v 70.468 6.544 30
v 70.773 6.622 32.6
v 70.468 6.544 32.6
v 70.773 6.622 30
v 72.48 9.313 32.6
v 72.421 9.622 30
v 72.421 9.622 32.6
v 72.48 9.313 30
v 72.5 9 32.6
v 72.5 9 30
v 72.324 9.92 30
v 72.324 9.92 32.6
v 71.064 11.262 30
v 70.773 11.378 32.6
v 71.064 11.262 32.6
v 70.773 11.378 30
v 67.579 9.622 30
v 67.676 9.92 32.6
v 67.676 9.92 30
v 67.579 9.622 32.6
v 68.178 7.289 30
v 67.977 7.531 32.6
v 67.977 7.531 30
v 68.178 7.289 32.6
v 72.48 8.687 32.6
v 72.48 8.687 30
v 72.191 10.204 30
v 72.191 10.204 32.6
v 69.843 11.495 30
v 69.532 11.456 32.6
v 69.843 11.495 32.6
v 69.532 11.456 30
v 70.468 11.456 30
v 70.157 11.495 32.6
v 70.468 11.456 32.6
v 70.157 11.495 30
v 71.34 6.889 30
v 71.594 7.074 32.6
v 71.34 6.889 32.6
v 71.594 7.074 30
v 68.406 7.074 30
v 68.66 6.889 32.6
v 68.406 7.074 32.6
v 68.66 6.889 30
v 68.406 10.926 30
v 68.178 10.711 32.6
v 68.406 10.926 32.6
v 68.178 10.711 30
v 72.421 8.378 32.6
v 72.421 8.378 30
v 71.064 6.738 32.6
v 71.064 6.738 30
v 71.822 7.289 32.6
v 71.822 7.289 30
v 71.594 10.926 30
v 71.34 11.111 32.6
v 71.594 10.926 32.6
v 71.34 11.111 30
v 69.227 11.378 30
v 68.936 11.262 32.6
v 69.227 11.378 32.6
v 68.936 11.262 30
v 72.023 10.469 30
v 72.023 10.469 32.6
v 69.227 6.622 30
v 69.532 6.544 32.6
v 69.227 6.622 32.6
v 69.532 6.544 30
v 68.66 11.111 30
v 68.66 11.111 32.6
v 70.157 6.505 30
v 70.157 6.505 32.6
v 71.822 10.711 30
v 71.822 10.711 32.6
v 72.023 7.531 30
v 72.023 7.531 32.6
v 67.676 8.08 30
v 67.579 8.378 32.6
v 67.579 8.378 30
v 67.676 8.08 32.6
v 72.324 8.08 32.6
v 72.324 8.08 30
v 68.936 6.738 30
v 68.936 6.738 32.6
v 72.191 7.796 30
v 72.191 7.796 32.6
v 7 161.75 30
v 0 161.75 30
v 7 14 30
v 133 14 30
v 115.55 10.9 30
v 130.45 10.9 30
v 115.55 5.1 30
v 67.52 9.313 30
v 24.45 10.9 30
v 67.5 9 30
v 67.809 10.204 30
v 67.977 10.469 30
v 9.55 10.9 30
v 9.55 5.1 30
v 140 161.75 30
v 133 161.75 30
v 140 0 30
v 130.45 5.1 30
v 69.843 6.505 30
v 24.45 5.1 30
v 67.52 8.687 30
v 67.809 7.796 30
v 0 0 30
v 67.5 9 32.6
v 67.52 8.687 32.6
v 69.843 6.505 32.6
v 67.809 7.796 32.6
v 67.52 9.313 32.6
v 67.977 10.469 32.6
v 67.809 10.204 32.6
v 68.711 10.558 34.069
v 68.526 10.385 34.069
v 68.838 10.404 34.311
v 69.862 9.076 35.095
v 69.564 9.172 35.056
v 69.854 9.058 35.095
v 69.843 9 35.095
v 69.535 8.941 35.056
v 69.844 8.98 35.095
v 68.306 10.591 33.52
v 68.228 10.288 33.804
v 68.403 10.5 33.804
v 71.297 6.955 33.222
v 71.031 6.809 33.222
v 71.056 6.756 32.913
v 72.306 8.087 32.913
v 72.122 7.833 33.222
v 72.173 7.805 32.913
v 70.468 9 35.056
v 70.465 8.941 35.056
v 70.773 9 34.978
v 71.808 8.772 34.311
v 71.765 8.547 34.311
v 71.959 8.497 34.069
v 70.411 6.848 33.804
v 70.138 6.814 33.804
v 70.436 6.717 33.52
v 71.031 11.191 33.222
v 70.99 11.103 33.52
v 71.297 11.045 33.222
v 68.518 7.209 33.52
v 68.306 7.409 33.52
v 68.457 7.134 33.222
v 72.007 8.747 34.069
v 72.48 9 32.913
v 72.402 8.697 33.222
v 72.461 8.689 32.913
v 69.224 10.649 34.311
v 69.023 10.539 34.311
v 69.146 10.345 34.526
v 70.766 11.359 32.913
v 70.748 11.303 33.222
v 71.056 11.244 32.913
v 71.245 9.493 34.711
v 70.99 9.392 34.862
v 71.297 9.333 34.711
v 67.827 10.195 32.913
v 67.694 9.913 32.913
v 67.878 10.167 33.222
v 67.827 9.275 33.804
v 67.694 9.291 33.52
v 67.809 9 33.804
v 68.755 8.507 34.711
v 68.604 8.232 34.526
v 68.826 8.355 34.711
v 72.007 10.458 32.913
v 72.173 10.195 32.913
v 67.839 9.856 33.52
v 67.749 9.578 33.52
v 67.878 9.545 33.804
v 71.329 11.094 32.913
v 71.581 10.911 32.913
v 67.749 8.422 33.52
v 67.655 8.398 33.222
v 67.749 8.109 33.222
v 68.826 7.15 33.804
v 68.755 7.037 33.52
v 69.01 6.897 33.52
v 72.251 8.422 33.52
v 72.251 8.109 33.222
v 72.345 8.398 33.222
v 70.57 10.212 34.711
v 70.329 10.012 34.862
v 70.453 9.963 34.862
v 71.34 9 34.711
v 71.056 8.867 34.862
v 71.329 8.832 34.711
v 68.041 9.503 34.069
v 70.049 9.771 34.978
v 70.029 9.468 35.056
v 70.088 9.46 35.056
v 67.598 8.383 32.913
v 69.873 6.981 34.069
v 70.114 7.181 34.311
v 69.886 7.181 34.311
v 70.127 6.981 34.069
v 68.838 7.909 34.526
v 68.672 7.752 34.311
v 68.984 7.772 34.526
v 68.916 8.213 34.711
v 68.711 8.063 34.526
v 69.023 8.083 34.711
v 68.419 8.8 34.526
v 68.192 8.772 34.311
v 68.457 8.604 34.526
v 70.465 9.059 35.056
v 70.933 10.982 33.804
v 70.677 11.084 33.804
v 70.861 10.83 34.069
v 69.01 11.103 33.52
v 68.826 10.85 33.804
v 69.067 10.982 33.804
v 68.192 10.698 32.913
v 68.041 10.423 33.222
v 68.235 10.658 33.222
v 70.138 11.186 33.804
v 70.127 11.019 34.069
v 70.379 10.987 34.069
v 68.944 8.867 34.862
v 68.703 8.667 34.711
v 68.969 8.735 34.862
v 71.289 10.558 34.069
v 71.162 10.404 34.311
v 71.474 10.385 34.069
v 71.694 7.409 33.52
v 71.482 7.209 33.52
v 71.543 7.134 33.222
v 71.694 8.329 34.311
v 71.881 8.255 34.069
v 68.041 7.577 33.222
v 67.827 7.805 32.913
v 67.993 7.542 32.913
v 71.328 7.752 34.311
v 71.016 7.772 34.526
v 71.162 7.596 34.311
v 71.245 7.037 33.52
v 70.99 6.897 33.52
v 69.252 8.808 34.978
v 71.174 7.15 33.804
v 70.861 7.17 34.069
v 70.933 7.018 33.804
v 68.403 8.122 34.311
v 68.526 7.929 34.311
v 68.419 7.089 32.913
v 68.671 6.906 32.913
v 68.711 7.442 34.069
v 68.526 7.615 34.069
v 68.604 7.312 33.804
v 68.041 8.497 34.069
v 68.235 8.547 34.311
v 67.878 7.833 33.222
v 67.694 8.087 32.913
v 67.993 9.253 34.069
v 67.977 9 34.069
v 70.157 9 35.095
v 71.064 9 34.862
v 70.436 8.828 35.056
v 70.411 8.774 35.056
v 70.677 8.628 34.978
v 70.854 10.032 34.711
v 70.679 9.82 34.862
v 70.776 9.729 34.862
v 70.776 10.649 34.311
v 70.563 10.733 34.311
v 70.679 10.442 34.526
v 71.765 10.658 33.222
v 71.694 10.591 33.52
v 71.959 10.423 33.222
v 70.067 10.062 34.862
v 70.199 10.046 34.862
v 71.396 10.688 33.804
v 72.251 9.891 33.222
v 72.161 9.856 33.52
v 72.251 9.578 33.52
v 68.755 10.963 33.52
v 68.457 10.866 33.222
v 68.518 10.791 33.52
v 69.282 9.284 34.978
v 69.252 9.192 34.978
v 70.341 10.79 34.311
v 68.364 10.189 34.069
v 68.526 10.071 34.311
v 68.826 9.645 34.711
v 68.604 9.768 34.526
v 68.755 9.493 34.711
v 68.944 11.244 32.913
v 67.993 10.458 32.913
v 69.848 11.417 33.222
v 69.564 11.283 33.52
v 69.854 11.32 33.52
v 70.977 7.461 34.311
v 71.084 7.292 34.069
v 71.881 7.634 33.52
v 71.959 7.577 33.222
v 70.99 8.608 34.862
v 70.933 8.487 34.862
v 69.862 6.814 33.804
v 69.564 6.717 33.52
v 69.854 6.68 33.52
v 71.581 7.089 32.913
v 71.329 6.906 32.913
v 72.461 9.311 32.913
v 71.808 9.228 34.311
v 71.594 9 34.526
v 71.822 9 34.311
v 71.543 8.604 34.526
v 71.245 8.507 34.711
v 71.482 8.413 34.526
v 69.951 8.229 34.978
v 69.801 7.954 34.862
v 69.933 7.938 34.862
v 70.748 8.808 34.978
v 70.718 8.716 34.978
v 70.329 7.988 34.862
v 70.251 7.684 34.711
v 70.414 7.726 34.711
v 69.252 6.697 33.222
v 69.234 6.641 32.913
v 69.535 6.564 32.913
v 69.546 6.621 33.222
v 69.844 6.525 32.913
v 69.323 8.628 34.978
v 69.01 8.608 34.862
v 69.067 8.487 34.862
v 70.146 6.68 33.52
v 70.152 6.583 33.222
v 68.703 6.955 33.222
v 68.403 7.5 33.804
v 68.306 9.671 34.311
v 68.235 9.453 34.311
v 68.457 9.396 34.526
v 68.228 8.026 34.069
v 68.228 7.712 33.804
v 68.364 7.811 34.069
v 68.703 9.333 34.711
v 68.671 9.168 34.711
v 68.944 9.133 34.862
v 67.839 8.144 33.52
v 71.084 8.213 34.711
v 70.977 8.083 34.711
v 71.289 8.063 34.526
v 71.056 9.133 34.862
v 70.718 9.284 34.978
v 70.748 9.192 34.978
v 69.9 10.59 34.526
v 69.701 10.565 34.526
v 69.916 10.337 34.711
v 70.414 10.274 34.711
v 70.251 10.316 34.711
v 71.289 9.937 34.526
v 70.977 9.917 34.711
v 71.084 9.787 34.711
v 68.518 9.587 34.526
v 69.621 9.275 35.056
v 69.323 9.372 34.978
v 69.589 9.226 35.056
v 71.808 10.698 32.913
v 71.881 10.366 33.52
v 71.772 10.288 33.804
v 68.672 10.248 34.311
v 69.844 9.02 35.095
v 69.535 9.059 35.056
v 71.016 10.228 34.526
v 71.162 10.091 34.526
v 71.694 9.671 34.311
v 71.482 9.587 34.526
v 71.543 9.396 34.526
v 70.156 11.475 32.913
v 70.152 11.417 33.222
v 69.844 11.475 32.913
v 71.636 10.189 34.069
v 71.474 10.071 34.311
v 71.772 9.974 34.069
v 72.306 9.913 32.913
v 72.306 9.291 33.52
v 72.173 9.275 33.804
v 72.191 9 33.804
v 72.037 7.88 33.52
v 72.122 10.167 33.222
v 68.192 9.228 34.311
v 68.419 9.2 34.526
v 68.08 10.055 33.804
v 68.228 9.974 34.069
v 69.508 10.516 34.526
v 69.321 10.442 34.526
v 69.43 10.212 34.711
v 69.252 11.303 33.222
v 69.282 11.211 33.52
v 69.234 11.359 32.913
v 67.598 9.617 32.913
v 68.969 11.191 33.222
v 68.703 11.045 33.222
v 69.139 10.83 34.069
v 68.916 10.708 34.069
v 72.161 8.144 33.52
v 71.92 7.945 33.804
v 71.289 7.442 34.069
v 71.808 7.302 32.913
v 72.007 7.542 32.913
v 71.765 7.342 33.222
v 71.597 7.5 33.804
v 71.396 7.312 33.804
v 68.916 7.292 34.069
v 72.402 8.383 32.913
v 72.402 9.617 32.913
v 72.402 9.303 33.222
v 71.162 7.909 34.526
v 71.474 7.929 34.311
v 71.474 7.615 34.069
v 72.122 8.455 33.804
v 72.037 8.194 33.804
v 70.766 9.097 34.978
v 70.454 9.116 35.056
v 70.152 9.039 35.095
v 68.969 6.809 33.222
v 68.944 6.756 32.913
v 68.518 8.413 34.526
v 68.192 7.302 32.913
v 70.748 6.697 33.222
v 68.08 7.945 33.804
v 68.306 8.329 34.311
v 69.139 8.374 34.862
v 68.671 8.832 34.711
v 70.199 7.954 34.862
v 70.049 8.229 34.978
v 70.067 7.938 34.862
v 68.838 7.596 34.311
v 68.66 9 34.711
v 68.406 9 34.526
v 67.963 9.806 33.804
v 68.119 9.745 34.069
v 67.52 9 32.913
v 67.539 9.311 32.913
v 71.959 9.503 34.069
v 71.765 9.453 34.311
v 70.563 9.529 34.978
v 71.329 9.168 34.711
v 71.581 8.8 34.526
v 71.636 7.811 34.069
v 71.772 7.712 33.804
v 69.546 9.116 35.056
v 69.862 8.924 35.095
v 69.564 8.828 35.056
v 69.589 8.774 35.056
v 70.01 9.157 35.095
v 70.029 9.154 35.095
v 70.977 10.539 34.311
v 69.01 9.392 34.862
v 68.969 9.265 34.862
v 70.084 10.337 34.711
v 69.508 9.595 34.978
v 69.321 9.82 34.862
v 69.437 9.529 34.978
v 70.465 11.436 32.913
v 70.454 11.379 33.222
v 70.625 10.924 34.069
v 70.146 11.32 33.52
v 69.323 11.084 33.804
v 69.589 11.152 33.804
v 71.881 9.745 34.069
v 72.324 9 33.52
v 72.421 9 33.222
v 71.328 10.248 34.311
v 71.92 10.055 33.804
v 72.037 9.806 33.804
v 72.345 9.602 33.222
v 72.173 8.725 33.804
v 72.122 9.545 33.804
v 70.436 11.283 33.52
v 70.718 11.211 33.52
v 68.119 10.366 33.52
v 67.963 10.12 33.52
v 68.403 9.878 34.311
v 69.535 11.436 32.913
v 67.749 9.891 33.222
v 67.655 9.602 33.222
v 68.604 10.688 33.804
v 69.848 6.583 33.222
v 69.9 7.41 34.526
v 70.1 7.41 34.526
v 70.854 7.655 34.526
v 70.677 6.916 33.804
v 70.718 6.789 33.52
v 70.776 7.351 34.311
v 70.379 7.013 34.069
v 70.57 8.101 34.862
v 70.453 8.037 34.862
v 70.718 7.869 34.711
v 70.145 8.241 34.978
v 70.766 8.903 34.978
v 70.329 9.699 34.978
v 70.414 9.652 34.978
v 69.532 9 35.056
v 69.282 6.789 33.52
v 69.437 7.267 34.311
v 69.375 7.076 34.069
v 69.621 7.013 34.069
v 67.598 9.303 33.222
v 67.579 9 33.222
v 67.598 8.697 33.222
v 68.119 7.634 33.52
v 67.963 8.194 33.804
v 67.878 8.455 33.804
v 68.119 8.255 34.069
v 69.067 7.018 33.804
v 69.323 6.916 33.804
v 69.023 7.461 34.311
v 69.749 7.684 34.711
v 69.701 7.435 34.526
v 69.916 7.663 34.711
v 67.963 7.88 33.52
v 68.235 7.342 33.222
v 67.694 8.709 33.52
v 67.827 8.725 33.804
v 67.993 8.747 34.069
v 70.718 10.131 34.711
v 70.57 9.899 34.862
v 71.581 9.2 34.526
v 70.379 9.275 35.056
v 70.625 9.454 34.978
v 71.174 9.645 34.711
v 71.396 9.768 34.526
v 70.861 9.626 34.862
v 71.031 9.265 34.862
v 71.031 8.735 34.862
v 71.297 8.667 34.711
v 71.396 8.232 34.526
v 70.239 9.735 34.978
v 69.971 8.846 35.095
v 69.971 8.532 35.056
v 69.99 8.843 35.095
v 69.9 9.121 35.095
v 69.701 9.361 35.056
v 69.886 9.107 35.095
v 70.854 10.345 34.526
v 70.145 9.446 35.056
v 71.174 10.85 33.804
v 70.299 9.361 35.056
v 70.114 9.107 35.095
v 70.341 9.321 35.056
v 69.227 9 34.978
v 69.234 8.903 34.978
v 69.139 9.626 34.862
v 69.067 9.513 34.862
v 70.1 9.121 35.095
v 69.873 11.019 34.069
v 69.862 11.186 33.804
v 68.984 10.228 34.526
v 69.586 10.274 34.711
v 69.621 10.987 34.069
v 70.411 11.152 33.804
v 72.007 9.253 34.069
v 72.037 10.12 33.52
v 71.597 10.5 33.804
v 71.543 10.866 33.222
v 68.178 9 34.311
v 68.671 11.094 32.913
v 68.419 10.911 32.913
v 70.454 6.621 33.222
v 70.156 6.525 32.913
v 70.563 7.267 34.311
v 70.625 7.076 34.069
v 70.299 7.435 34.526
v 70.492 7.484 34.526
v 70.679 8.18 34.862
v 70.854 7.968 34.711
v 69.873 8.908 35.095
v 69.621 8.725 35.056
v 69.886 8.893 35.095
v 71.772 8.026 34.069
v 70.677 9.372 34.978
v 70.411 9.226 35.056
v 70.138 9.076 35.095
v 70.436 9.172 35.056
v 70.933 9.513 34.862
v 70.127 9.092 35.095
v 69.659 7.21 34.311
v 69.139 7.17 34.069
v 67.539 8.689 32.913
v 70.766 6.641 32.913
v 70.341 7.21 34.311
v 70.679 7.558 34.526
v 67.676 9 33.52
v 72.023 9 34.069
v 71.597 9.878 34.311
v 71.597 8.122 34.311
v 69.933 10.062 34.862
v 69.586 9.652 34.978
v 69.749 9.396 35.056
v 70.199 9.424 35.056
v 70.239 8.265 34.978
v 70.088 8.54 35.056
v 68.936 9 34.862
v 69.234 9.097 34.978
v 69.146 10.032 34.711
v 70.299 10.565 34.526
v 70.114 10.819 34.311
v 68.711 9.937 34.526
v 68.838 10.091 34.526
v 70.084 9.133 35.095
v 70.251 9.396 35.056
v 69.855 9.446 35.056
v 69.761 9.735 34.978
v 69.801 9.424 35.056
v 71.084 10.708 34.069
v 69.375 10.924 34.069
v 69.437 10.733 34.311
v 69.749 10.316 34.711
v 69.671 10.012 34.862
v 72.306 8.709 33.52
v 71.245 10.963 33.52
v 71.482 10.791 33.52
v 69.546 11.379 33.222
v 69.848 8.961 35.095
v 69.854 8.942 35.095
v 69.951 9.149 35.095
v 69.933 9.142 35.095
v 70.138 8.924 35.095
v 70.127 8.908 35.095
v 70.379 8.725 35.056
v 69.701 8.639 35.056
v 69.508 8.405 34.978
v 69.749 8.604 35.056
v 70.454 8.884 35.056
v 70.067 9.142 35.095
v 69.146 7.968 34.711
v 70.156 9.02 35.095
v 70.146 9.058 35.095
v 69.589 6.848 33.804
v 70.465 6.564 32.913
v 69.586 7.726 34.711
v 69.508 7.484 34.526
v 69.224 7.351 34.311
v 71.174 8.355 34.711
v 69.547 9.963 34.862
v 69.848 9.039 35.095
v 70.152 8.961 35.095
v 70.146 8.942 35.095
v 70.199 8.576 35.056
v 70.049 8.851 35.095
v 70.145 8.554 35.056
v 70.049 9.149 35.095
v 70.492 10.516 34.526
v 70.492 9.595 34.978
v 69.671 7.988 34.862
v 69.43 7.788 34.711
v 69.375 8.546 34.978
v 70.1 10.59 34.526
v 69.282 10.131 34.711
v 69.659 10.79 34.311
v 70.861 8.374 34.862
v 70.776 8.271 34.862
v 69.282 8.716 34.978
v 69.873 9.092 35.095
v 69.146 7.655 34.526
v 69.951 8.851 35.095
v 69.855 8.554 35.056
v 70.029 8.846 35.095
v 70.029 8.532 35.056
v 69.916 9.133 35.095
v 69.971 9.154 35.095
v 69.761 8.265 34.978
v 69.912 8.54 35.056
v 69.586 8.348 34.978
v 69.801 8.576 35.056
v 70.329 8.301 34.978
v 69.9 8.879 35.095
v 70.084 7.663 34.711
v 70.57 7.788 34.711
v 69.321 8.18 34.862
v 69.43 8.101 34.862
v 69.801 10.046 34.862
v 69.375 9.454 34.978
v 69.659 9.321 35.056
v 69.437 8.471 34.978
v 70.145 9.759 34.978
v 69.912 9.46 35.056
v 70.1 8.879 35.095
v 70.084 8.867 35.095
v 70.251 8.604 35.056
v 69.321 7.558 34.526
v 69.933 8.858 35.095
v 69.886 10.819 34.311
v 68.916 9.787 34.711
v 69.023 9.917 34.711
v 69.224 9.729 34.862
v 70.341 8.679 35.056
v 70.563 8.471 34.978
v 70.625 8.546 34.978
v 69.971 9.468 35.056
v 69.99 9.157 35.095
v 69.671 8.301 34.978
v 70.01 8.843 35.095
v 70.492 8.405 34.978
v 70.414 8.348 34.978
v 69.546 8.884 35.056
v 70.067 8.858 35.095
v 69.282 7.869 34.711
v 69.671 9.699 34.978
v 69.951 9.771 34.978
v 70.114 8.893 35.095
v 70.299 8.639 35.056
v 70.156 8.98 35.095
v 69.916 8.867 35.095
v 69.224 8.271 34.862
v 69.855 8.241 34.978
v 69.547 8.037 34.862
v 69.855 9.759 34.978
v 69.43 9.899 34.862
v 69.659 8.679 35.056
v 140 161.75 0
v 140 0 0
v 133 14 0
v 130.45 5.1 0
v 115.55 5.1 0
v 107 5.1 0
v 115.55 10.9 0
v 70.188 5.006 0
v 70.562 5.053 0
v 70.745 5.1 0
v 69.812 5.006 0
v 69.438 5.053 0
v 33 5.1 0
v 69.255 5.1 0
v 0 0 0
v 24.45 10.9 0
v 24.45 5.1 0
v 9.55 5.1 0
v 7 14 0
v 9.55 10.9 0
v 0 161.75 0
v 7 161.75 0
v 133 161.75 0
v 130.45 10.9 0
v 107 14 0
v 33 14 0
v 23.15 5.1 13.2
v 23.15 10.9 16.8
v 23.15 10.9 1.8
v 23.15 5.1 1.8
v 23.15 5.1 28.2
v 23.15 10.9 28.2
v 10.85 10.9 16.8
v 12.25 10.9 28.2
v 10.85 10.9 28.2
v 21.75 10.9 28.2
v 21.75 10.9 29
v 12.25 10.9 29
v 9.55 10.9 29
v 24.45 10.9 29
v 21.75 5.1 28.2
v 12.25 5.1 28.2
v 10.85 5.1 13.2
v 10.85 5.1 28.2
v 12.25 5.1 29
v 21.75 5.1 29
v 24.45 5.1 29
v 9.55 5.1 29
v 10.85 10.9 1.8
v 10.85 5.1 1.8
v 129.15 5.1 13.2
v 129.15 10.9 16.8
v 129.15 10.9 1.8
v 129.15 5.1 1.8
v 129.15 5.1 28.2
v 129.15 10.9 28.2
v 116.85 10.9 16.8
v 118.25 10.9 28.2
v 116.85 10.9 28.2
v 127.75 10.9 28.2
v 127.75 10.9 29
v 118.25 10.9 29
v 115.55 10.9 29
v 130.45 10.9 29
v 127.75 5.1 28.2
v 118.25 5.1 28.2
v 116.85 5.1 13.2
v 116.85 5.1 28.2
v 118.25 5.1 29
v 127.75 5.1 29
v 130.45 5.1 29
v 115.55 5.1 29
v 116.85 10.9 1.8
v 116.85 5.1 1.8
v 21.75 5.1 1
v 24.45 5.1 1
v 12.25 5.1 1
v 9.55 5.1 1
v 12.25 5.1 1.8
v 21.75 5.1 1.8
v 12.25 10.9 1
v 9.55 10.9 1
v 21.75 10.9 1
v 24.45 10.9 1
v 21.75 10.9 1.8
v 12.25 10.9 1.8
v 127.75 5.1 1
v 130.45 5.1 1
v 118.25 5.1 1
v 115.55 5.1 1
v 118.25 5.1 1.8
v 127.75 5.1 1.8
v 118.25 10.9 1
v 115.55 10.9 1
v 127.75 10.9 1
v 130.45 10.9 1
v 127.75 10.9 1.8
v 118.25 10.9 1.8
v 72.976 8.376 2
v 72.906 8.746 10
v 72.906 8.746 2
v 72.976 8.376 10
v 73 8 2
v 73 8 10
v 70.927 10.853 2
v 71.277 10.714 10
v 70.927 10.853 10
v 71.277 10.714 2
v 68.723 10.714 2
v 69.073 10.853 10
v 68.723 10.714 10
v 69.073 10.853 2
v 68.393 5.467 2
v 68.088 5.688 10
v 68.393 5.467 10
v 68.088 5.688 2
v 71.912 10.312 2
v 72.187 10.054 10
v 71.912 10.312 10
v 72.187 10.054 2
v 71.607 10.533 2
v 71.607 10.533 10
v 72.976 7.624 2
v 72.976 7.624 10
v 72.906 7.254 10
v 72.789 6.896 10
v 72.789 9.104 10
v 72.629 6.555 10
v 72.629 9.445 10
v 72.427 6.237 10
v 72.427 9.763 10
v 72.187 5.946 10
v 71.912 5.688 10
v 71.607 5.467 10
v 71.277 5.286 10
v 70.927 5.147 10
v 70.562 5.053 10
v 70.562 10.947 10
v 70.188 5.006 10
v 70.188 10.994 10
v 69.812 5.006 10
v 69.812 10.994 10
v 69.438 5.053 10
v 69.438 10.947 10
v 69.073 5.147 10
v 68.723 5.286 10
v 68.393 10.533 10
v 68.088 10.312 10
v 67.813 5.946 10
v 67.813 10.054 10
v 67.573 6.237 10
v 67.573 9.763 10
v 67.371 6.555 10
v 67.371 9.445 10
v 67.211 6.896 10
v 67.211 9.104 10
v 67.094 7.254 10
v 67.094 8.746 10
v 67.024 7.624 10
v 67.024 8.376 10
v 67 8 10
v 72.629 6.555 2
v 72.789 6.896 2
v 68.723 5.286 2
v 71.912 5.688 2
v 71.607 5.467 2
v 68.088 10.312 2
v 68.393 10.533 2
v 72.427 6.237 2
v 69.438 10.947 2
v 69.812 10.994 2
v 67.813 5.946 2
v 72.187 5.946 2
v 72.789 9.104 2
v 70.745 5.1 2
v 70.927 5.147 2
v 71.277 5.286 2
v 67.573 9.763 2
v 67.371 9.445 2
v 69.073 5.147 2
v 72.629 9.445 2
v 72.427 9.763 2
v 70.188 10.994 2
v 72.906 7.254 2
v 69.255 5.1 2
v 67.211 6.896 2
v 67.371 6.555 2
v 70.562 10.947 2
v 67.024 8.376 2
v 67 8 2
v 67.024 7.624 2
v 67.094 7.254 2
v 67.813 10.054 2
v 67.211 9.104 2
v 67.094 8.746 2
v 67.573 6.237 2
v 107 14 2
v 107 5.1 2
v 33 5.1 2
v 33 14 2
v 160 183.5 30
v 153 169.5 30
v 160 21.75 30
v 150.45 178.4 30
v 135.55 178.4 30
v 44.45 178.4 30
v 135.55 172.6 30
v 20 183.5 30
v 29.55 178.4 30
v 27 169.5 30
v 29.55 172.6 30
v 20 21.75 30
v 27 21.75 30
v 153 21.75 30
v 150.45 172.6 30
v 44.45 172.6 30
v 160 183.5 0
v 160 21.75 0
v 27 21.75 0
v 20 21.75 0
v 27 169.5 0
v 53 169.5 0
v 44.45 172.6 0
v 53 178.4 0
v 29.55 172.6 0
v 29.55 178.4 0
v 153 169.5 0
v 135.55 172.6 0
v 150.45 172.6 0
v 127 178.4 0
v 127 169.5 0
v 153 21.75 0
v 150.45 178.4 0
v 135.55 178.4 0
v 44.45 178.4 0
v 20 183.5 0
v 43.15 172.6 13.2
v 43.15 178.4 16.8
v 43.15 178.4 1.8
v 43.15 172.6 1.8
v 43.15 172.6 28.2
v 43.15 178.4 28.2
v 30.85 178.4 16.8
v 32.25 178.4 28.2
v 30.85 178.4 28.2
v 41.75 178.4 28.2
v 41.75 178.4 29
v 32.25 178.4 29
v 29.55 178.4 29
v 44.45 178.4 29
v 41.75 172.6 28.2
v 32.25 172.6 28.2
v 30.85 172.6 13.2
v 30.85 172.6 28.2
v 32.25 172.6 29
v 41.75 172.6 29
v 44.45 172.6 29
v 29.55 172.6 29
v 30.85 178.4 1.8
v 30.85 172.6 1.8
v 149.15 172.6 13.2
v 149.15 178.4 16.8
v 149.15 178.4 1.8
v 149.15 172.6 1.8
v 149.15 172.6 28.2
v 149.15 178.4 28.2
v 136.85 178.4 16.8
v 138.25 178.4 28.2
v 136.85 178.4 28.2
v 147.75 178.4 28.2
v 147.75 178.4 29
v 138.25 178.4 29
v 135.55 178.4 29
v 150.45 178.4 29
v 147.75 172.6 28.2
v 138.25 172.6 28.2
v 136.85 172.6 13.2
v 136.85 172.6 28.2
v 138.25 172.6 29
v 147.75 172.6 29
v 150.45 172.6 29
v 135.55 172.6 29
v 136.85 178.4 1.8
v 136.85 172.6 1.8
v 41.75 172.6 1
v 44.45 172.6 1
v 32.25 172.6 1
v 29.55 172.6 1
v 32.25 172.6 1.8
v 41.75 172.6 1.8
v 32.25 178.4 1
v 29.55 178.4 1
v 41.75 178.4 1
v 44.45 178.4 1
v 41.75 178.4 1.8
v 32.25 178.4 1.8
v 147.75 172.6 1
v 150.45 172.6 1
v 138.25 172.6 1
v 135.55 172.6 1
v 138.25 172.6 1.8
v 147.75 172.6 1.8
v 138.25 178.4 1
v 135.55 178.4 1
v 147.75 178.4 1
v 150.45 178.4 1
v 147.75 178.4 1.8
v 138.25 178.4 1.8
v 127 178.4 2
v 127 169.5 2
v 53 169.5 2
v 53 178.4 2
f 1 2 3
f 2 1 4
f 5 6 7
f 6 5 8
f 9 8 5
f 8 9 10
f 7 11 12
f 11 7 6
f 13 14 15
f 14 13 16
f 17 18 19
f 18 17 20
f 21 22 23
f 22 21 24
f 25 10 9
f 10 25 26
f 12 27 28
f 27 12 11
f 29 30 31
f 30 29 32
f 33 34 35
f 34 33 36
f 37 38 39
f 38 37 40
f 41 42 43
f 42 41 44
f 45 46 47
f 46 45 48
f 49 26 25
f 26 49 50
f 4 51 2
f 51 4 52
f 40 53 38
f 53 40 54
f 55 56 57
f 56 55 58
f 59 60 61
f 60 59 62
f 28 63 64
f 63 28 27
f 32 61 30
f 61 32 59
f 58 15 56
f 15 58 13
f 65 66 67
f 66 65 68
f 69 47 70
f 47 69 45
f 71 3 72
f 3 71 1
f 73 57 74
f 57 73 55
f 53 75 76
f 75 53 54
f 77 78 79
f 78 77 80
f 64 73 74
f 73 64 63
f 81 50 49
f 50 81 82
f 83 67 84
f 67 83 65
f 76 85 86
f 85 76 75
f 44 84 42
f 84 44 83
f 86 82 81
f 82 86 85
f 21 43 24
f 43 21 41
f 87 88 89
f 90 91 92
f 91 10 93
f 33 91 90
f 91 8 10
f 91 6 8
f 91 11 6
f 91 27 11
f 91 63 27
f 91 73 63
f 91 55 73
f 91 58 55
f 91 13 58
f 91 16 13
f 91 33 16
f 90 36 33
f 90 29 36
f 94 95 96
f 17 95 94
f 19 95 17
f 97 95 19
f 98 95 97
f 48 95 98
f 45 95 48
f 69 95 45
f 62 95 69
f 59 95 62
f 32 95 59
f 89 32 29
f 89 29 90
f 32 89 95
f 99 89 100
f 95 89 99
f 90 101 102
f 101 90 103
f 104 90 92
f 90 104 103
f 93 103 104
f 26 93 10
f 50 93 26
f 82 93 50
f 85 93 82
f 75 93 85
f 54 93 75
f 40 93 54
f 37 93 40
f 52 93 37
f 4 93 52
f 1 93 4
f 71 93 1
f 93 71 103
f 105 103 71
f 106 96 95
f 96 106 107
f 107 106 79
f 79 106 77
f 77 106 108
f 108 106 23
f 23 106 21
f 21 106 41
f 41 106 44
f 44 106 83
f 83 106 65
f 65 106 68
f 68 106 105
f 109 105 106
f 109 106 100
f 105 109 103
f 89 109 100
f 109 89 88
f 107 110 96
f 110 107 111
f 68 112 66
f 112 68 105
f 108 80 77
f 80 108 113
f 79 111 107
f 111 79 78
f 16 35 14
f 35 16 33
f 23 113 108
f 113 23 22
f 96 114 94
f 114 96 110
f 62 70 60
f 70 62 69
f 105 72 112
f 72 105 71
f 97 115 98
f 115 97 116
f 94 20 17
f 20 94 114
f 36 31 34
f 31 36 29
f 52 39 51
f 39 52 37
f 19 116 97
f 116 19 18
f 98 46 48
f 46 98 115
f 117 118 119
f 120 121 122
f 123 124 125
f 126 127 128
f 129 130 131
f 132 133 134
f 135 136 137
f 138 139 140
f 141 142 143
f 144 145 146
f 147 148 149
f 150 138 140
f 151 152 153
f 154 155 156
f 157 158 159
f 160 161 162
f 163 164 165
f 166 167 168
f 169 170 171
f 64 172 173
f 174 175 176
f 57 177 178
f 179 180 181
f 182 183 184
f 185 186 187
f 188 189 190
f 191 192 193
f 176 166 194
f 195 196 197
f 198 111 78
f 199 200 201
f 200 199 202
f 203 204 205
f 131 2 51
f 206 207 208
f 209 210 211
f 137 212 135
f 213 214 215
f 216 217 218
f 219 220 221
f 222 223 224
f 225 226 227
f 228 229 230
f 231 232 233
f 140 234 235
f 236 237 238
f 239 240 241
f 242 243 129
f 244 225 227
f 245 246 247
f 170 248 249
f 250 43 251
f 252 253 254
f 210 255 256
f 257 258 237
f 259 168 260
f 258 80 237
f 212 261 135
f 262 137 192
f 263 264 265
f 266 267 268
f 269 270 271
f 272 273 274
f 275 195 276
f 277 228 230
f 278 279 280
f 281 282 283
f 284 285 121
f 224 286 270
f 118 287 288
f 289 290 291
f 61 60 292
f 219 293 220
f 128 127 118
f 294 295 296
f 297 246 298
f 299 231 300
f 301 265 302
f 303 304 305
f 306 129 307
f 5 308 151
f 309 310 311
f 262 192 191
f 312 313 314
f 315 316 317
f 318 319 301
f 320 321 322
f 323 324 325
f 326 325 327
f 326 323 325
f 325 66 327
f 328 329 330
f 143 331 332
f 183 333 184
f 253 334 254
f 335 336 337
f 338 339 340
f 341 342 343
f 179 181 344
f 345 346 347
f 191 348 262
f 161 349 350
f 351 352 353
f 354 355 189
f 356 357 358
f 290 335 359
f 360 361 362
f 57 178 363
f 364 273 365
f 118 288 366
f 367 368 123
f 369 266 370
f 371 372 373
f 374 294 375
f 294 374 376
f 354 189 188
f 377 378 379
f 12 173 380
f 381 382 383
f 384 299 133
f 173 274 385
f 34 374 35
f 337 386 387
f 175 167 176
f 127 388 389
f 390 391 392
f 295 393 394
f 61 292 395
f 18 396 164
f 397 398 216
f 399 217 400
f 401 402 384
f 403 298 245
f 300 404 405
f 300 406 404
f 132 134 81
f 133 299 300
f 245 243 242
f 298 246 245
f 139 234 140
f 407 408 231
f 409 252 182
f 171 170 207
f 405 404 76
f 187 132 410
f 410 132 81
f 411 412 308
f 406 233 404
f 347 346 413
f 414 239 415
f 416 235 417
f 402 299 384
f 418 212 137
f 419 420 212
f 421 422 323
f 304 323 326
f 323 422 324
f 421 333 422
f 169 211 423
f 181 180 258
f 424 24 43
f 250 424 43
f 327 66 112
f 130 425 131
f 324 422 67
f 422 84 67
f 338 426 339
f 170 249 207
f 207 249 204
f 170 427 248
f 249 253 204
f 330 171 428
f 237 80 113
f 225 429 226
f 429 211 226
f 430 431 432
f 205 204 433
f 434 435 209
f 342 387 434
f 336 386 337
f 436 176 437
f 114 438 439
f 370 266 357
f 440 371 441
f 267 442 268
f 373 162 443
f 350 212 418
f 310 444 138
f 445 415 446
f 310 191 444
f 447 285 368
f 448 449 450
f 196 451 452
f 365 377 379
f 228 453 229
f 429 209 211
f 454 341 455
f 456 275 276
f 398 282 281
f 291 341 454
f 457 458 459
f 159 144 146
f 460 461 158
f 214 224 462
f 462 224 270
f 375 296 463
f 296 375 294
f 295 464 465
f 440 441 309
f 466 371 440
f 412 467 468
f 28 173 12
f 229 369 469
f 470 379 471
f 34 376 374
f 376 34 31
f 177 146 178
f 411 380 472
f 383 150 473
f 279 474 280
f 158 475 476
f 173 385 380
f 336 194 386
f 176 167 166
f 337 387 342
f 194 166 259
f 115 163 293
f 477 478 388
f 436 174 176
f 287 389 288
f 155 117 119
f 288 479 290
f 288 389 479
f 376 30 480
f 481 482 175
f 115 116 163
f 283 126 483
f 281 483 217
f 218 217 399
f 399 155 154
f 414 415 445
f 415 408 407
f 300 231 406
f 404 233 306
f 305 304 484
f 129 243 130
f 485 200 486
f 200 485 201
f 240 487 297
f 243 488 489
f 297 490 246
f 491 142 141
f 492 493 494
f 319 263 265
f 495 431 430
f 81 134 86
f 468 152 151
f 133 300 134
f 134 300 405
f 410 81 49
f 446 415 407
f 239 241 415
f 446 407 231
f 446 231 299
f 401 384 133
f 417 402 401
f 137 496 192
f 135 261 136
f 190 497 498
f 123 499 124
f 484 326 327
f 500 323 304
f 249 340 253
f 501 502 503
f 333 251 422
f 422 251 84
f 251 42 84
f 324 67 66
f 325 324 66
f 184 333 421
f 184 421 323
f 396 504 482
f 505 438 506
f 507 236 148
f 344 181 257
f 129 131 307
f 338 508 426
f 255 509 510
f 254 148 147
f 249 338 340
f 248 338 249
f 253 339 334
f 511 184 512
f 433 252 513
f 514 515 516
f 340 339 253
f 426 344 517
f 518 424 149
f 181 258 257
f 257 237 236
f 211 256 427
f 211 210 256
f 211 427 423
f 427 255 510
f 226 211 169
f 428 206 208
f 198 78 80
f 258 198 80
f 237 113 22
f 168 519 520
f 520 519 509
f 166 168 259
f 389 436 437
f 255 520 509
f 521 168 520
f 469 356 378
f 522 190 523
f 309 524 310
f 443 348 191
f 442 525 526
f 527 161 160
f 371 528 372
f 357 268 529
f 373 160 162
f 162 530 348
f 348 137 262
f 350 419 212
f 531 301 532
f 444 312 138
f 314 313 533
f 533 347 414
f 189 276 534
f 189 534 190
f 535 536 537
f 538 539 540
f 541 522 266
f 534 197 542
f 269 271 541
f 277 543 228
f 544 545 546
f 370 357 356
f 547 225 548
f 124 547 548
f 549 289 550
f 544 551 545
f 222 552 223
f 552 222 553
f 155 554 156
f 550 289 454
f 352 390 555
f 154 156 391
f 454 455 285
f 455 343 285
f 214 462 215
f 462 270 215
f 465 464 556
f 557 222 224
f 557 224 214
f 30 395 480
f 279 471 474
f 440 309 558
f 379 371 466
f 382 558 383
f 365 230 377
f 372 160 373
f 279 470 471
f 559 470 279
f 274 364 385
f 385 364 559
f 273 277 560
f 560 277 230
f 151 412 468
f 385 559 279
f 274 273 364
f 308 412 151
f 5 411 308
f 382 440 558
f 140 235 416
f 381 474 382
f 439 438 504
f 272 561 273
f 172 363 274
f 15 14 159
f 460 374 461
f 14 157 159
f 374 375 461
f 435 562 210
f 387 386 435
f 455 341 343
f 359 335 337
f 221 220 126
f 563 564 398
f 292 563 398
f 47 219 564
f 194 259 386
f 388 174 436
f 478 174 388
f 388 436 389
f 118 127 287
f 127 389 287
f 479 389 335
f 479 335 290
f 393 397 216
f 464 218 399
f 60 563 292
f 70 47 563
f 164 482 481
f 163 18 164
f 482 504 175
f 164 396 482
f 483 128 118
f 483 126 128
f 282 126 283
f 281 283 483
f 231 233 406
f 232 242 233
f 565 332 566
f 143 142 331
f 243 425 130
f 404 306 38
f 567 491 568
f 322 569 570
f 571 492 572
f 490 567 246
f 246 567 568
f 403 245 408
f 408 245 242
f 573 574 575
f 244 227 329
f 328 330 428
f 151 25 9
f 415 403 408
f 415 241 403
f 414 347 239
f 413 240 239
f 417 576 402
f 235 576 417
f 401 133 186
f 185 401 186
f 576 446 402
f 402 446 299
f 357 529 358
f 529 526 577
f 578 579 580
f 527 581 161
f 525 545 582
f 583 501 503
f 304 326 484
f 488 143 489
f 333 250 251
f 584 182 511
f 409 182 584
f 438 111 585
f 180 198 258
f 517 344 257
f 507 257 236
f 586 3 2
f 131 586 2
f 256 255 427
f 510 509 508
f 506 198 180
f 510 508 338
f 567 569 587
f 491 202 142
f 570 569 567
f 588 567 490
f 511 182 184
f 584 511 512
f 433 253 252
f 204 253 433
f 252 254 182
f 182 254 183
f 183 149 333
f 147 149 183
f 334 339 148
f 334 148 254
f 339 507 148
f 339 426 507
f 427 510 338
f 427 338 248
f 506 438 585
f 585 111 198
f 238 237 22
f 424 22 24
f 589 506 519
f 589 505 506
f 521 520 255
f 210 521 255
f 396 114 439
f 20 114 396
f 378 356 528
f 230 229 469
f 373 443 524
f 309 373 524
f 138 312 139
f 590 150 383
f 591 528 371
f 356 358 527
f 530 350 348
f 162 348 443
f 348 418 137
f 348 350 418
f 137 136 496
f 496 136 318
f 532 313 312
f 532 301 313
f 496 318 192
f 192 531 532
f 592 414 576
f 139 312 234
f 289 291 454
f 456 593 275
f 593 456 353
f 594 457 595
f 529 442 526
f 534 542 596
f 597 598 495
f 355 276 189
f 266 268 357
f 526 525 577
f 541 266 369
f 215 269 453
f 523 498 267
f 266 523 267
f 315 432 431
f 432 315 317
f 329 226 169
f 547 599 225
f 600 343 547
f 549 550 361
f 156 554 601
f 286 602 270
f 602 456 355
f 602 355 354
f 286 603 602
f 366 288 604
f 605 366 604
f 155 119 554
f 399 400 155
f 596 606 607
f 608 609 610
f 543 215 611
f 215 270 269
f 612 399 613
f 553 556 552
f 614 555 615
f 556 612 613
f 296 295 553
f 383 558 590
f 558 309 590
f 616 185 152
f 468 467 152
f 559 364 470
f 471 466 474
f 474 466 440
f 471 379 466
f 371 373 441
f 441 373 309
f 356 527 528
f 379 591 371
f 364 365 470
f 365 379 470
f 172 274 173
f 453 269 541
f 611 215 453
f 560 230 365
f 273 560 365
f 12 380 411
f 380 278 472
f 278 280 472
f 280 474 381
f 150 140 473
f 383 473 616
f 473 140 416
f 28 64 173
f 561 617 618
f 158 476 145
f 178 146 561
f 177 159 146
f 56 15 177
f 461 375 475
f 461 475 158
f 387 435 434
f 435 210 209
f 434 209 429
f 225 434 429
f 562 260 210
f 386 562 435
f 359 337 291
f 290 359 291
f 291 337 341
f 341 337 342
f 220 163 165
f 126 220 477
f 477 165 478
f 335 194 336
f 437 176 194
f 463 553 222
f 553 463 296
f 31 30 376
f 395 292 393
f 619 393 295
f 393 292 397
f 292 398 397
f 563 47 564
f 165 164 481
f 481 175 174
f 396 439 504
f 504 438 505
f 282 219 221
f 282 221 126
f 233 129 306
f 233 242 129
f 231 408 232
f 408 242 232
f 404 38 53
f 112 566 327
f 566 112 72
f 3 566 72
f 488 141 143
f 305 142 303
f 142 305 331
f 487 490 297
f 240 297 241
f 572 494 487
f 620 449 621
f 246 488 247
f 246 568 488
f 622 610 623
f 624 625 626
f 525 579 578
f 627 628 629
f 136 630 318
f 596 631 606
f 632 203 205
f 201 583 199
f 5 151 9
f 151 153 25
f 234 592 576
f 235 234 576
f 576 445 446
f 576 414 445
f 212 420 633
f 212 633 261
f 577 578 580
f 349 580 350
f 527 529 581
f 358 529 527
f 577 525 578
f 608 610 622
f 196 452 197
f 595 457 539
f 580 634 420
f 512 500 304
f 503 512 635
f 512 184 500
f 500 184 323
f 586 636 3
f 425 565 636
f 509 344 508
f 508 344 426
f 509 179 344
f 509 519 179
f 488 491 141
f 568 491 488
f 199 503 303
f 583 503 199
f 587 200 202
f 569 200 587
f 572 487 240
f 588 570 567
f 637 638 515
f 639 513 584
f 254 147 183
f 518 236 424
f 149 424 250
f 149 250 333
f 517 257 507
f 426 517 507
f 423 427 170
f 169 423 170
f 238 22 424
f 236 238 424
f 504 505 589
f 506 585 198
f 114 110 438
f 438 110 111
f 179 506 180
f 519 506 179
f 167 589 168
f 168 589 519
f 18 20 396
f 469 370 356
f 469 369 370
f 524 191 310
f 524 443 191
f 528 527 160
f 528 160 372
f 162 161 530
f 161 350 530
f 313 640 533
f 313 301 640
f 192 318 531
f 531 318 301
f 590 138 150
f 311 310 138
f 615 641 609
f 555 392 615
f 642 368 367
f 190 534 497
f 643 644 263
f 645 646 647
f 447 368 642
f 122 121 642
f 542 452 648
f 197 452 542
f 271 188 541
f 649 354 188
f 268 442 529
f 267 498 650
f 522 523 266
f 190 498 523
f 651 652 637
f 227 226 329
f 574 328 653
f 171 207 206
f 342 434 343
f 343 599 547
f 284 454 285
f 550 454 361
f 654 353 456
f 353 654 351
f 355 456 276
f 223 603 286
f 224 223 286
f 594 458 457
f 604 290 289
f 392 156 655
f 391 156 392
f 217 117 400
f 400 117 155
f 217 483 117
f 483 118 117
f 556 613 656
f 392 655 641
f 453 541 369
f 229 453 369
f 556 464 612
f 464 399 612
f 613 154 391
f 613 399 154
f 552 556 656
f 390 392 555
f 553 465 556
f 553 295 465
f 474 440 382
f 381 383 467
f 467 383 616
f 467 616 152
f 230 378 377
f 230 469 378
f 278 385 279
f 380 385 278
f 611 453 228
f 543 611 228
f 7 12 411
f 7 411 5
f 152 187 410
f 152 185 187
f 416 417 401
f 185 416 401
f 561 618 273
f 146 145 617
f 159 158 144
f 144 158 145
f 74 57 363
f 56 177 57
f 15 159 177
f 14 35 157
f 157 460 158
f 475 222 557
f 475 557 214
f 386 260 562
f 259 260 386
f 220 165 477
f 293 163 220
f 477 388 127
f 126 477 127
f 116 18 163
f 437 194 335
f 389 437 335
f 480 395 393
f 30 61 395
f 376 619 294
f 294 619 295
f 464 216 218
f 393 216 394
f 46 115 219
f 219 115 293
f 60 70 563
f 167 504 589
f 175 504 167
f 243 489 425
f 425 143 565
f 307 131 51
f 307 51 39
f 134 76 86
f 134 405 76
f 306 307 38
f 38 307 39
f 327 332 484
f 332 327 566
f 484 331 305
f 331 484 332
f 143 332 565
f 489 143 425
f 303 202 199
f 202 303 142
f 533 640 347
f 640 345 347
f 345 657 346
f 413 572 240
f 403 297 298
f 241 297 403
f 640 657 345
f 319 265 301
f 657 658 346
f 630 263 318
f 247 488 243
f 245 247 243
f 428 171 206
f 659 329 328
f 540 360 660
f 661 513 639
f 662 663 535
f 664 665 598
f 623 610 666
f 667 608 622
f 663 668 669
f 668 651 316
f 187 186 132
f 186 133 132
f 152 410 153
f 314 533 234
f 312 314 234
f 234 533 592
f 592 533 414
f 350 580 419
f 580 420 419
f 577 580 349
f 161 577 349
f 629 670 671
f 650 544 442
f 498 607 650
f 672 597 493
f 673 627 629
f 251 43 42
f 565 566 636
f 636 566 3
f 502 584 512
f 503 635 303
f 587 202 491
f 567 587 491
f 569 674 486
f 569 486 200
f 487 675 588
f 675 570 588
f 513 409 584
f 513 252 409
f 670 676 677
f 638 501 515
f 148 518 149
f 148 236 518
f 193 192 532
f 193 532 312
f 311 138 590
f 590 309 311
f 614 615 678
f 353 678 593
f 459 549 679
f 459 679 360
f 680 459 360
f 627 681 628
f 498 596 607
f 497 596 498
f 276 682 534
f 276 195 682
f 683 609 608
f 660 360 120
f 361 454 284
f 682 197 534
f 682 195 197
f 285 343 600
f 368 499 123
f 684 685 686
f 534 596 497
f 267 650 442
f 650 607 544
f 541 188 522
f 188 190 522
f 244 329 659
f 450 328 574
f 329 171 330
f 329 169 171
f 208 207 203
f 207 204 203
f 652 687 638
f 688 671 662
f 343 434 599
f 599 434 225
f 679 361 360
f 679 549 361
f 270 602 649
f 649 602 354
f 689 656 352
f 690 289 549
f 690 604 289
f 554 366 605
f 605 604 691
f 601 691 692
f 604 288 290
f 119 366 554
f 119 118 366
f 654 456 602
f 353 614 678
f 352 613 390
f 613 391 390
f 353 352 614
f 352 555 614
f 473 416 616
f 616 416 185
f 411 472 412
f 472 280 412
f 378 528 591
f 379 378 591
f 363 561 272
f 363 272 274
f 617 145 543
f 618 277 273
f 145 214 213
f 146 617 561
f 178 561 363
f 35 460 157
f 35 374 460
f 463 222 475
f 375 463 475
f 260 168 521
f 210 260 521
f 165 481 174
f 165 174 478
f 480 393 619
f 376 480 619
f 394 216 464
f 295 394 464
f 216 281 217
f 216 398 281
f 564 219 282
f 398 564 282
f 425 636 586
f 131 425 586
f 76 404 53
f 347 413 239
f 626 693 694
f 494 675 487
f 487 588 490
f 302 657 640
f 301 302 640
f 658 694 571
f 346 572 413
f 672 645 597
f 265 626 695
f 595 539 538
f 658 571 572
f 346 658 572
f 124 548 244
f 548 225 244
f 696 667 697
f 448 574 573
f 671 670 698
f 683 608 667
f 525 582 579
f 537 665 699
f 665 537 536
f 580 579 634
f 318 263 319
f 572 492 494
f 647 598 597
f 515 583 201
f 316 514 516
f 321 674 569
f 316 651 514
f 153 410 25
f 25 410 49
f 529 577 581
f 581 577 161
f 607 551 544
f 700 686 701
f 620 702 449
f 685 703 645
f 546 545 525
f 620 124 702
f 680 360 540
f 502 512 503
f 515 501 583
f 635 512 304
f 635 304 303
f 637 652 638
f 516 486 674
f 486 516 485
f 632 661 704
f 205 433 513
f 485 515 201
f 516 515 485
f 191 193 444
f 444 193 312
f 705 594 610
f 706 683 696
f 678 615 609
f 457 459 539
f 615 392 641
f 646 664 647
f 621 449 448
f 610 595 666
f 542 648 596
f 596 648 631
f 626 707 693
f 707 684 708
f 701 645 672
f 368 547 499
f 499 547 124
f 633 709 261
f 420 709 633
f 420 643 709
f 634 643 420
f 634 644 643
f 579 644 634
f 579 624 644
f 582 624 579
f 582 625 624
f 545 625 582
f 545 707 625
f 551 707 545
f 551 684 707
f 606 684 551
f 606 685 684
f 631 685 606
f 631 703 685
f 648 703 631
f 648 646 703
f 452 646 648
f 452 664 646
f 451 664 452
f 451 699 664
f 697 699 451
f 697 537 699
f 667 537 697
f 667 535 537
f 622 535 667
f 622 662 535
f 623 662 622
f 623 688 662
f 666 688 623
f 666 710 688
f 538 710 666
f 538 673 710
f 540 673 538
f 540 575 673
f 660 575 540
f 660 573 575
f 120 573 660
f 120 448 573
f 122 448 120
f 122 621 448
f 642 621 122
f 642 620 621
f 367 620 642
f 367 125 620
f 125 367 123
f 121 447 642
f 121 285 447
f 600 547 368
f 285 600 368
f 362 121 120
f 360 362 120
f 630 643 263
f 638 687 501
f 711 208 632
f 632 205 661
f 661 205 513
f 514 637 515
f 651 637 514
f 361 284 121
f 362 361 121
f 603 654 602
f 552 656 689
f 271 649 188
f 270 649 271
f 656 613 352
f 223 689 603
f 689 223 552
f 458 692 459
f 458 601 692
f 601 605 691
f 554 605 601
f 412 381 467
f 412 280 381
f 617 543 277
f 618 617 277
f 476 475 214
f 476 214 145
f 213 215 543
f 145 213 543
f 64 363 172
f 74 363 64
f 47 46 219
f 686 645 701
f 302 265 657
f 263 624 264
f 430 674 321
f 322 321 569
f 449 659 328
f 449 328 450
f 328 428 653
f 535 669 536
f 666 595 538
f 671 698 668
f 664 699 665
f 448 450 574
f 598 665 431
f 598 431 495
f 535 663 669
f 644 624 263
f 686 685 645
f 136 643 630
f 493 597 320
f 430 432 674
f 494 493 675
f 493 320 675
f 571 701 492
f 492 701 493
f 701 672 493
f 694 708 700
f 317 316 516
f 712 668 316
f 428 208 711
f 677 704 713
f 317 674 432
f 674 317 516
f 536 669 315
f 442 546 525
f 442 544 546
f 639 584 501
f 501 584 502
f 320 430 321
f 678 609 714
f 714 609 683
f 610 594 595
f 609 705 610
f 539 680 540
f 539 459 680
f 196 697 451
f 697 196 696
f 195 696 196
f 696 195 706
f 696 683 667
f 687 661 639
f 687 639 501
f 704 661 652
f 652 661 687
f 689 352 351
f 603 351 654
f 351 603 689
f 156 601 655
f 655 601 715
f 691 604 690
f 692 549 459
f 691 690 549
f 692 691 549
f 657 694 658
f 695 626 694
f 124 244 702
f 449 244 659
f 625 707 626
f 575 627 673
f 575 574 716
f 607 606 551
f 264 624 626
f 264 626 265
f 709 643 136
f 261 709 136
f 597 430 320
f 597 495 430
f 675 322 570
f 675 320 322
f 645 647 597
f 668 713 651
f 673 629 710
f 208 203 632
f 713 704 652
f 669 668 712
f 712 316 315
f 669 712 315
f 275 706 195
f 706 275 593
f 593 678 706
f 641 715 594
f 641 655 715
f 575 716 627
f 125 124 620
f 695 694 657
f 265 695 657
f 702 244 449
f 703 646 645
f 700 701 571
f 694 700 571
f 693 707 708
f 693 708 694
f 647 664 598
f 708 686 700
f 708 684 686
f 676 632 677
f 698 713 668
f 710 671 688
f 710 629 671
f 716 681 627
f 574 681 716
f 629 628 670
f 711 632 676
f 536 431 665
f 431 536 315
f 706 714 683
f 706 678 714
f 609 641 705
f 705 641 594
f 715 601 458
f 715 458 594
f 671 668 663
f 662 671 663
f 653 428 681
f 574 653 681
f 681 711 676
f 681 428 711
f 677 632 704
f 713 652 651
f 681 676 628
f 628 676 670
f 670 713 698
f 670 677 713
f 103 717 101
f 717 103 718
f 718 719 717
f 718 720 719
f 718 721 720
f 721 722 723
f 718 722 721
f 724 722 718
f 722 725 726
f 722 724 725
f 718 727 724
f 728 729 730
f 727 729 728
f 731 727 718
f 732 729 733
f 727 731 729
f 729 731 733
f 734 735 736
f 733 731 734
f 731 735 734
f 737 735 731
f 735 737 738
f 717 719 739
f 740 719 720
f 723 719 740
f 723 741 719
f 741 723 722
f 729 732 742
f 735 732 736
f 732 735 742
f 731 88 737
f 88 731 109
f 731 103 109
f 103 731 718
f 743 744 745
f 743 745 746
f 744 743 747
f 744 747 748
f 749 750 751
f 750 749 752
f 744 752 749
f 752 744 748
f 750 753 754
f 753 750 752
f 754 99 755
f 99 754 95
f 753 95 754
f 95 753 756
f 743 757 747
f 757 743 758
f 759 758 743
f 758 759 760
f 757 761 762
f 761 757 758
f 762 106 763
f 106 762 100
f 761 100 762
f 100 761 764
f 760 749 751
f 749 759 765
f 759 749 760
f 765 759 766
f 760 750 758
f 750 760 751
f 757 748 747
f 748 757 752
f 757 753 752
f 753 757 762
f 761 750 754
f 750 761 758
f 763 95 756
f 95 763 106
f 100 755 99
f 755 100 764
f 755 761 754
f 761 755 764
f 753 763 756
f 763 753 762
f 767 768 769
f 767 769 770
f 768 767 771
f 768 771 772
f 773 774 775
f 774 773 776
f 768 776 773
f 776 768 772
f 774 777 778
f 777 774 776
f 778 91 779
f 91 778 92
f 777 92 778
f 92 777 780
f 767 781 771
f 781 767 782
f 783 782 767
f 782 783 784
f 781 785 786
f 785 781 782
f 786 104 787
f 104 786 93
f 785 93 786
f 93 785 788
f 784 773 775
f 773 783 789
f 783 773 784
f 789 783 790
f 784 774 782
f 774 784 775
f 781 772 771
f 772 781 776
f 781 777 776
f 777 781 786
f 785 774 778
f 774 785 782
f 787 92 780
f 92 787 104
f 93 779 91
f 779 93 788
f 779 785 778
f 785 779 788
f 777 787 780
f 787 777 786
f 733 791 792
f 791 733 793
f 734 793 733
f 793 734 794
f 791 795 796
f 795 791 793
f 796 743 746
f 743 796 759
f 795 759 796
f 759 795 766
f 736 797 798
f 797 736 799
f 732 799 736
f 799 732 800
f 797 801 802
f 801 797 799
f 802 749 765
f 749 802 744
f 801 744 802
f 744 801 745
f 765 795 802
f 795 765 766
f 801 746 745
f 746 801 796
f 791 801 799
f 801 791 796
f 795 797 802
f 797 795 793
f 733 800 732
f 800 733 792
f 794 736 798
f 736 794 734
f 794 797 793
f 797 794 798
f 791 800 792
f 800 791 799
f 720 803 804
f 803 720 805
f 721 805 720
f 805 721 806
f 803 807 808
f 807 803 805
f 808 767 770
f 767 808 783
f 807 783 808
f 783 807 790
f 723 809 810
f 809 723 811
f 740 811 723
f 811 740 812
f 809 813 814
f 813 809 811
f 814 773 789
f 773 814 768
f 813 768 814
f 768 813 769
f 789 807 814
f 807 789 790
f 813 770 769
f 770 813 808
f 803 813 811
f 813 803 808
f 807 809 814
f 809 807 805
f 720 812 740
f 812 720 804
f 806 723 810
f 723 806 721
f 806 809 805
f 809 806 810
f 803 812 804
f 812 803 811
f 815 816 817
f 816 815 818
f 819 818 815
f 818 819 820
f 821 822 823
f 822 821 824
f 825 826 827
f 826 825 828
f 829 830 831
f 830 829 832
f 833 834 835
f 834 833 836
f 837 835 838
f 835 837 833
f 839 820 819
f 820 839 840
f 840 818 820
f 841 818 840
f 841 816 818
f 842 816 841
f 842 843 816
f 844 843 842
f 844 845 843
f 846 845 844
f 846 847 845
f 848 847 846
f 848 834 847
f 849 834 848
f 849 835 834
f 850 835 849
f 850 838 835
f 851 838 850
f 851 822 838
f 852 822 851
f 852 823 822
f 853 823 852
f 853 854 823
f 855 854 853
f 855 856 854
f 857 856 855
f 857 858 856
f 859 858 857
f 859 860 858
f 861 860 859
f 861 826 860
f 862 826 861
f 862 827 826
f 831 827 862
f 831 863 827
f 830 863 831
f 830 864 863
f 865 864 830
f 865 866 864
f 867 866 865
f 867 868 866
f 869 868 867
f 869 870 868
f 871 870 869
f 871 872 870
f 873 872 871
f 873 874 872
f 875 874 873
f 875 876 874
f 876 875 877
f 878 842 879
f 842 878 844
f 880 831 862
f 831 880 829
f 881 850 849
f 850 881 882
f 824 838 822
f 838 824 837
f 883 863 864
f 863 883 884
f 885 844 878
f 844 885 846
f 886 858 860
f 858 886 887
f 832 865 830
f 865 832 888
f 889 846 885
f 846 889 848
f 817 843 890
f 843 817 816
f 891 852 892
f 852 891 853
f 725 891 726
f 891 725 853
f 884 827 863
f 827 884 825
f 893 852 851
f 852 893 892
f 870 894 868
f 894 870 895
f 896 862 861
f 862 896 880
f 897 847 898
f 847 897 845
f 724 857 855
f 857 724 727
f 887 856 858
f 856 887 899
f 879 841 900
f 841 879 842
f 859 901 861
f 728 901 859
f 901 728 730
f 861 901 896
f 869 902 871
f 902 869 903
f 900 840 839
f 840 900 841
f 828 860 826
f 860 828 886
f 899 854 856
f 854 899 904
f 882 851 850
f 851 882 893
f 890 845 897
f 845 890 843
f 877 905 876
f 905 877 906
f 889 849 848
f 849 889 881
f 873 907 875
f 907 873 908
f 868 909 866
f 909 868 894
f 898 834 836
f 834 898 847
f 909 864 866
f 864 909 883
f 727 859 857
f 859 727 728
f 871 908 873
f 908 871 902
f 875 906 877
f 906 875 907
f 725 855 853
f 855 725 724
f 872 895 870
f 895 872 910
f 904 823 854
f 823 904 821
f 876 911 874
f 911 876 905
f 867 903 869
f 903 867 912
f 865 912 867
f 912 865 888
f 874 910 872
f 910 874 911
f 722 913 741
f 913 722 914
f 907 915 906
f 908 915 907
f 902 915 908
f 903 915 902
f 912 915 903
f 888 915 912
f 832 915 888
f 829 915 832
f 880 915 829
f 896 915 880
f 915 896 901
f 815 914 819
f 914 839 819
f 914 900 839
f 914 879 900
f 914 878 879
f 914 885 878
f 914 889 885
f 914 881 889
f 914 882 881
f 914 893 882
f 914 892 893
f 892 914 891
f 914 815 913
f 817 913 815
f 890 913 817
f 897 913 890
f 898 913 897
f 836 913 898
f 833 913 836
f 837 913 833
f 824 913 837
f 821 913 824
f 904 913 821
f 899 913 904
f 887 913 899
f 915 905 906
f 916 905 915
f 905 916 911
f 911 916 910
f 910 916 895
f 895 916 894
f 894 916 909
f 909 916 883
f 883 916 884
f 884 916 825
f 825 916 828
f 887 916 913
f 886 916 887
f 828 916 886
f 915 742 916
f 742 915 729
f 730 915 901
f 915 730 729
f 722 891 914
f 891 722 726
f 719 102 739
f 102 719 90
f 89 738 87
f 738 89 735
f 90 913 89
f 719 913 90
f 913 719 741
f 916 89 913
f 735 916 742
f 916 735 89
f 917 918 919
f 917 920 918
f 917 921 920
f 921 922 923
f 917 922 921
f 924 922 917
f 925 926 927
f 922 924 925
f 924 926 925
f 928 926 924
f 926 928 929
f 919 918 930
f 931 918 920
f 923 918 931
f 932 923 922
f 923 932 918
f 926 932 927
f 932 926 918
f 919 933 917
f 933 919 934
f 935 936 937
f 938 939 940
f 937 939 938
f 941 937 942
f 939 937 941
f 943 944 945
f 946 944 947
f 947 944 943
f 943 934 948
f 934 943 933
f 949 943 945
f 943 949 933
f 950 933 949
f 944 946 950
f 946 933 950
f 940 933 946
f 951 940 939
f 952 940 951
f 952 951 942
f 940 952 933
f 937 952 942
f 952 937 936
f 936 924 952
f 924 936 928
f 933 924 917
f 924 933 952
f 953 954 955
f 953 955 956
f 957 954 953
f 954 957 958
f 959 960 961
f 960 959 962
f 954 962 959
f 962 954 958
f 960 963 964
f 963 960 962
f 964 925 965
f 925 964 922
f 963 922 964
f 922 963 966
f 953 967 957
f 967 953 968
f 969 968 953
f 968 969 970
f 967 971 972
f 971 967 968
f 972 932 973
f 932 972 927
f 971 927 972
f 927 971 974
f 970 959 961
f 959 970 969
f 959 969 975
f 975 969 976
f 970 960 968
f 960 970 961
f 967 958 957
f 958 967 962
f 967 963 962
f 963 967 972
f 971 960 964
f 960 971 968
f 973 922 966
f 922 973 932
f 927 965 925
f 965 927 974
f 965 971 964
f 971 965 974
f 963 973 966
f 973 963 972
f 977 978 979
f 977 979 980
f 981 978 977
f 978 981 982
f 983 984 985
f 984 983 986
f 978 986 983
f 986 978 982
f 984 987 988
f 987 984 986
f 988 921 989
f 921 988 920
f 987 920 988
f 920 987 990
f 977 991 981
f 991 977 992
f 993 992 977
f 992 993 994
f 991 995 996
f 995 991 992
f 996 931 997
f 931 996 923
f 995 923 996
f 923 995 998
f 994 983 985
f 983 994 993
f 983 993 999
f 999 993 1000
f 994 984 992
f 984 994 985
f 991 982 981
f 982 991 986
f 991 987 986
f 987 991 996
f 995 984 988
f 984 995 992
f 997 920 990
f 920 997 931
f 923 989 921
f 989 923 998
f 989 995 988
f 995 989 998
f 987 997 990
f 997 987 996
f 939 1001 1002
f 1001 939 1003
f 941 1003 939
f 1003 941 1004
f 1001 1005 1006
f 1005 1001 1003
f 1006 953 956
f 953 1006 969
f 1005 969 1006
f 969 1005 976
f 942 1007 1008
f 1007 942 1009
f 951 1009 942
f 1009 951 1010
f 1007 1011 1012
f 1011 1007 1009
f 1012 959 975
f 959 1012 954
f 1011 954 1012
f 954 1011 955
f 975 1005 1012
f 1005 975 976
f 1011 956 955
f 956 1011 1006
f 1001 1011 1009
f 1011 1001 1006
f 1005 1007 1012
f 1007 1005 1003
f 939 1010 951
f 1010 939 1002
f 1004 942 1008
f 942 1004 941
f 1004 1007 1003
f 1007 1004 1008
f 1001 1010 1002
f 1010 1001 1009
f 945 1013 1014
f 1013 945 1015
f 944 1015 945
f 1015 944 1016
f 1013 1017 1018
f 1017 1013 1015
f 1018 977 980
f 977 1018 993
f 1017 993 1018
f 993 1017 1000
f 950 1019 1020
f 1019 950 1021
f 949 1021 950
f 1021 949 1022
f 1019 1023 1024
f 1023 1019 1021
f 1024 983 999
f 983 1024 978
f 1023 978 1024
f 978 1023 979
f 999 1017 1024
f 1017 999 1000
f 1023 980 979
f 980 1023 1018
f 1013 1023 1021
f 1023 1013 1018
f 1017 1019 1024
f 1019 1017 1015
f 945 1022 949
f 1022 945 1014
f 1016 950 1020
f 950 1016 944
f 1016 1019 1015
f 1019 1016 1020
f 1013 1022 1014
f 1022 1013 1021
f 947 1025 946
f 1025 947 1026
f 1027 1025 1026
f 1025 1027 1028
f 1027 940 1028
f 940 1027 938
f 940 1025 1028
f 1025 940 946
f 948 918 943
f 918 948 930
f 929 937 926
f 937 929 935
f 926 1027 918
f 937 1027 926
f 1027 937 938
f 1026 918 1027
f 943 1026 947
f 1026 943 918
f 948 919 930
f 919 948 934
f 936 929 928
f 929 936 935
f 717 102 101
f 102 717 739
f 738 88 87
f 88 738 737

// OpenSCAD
// length of the extension in cm; at least 2 cm (~0.8 inches)
length = 3;
// change if click-mechanism does not fit or is too loose
socket_height = 5.8;
// split model in 2 parts for smaller printers
split_model = true;
// detail
$fn = 50;
// don't change, 140 is default value
width = 140;
// don't change, 323.5 is default value
height = 323.5;

whole_model(length, split_model);

module whole_model(length, split_model) {
    true_length = length * 10;
    if(split_model) {
        // top part
        translate([20, -140, 0]) {
            difference() {
                radiator_extension(true_length);
                cube([width,height/2,true_length + 10]);
            }
        }
        // bottom part
        difference() {
            radiator_extension(true_length);
            translate([0, height / 2, 0]) {
                cube([width,height/2,true_length + 10]);
            }

        }
    } else {
        radiator_extension(true_length);
    }
}

module radiator_extension(length) {
    length = max(length, 20);
    difference() {
        union(){
            cube([width, height, length]);
            translate([ width/2,
                9,
                length]) {
                stub_stem();
            }
        }
        side_distance = 17;
        top_distance = 8;
        stems(
            side_distance = side_distance,
            top_distance = top_distance,
            width = width,
            length = height,
            z_diff = length
        );
        sockets(
            side_distance = side_distance,
            top_distance = top_distance,
            width = width,
            length = height,
            z_diff = 0
        );
        clearance(width, height, length);
        radiator_anchors(width, height);
    }
}

module stems(
side_distance,
top_distance,
width,
length,
z_diff) {
    // top
    translate([ side_distance,
            length-top_distance,
        z_diff]) {
        rotate([180,0,0]){
            click_socket();
        }
    }
    translate([ width-side_distance,
            length-top_distance,
        z_diff]) {

        rotate([180,0,0]){
            click_socket();
        }
    }
    // bottom
    translate([ side_distance,
        top_distance,
        z_diff]) {

        rotate([180,0,0]){
            click_socket();
        }
    }
    translate([ width-side_distance,
        top_distance,
        z_diff]) {

        rotate([180,0,0]){
            click_socket();
        }
    }
}

module sockets(
side_distance,
top_distance,
width,
length,
z_diff) {
    // bottom
    translate([ side_distance,
        top_distance,
        z_diff]) {
        click_socket();
    }
    translate([ width/2,
        top_distance,
        z_diff]) {
        stub_socket();
    }
    translate([ width-side_distance,
        top_distance,
        z_diff]) {
        click_socket();
    }

    // top
    translate([ side_distance,
            length-top_distance,
        z_diff]) {
        click_socket();
    }
    translate([ width-side_distance,
            length-top_distance,
        z_diff]) {
        click_socket();
    }
}

module clearance(width, length, height) {
    back_front_distance = 14;
    left_right_distance = 7;
    translate([left_right_distance, back_front_distance,0]){
        cube([width-left_right_distance*2, length-back_front_distance*2, height]);
    }
}

module radiator_anchors(width, length) {
    slot_width = 74;
    slot_height = 9;
    outer_distance = 5.1;
    translate([(width-slot_width) / 2,outer_distance,0]) {
        cube([slot_width,slot_height,2]);
    }
    y_diff = length-slot_height-outer_distance;
    translate([(width-slot_width) / 2,y_diff,0]) {
        cube([slot_width,slot_height,2]);
    }
}

module click_socket() {
    depth = 15;
    holding_plate = 14.9;
    holder_thickness = 0.8;
    inner_chamber = 12.3;
    inlay = 1;
    hook_depth = 1.4;
    rotate([90,0,0]){
        translate([-holding_plate / 2, 0, -socket_height/2]){
            translate([holding_plate/2 - inner_chamber/2,holder_thickness + inlay,0]) {
                cube([inner_chamber,depth,socket_height]);
            }
            inside_width = inner_chamber - hook_depth * 2;
            translate([(holding_plate - inside_width) / 2,0,0]) {
                cube([inside_width, inlay + holder_thickness,socket_height]);
            }
            cube([holding_plate,inlay,socket_height]);
        }
    }
}

module stub_stem() {
    diameter = 5;
    radius = diameter / 2;
    totalHeight = 5.1;
    cylinder(d=diameter, h=totalHeight - radius);
    translate([0,0,totalHeight - radius]) {
        sphere(radius);
    }
}

module stub_socket() {
    cylinder(d=6, h=10);
}

module roundedcube(size = [1,1,1], radius = 5) {
    radius = min(size[0]/2-0.01, size[1]/2-0.01, radius);
    minkowski() {
        diameter = radius * 2;
        cube([
                size[0] - diameter,
                size[1] - diameter,
                size[2]/2]);
        translate([radius,radius]) {
            cylinder(r=radius,h=size[2]/2);
        }
    }
}
